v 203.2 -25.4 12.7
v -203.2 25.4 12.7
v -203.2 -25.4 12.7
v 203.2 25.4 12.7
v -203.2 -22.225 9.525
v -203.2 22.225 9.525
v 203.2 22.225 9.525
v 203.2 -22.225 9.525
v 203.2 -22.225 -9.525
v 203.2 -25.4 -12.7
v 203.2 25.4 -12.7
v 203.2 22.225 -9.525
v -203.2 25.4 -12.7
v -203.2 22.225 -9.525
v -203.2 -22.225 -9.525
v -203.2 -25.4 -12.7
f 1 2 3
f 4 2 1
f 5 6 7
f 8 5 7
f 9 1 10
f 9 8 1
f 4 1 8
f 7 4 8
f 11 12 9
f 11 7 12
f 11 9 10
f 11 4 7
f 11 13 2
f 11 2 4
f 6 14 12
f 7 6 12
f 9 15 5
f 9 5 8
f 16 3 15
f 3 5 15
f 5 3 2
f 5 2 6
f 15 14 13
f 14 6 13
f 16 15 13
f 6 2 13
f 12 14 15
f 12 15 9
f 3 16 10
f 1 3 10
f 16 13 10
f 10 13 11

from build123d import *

# Parameters (mm, degrees)
SKETCH1_W           = 406.4
SKETCH1_H           = 25.4
BOSS_EXTRUDE1_DEPTH = 25.4
SHELL1_T            = -3.175


with BuildPart() as part:
    # Sketch1 → Boss-Extrude1 (new body, symmetric)
    with BuildSketch(Plane(origin=(0, 0, 0), x_dir=(1, 0, 0), z_dir=(0, 1, 0))):
        Rectangle(SKETCH1_W, SKETCH1_H)
    extrude(amount=BOSS_EXTRUDE1_DEPTH, both=True)

    # Shell1
    shell1_openings = [part.faces().sort_by_distance(p)[0] for p in [
        (-203.2, 0, 0),
        (203.2, 0, 0),
    ]]
    offset(amount=SHELL1_T, openings=shell1_openings, kind=Kind.INTERSECTION)


solid = part.part
